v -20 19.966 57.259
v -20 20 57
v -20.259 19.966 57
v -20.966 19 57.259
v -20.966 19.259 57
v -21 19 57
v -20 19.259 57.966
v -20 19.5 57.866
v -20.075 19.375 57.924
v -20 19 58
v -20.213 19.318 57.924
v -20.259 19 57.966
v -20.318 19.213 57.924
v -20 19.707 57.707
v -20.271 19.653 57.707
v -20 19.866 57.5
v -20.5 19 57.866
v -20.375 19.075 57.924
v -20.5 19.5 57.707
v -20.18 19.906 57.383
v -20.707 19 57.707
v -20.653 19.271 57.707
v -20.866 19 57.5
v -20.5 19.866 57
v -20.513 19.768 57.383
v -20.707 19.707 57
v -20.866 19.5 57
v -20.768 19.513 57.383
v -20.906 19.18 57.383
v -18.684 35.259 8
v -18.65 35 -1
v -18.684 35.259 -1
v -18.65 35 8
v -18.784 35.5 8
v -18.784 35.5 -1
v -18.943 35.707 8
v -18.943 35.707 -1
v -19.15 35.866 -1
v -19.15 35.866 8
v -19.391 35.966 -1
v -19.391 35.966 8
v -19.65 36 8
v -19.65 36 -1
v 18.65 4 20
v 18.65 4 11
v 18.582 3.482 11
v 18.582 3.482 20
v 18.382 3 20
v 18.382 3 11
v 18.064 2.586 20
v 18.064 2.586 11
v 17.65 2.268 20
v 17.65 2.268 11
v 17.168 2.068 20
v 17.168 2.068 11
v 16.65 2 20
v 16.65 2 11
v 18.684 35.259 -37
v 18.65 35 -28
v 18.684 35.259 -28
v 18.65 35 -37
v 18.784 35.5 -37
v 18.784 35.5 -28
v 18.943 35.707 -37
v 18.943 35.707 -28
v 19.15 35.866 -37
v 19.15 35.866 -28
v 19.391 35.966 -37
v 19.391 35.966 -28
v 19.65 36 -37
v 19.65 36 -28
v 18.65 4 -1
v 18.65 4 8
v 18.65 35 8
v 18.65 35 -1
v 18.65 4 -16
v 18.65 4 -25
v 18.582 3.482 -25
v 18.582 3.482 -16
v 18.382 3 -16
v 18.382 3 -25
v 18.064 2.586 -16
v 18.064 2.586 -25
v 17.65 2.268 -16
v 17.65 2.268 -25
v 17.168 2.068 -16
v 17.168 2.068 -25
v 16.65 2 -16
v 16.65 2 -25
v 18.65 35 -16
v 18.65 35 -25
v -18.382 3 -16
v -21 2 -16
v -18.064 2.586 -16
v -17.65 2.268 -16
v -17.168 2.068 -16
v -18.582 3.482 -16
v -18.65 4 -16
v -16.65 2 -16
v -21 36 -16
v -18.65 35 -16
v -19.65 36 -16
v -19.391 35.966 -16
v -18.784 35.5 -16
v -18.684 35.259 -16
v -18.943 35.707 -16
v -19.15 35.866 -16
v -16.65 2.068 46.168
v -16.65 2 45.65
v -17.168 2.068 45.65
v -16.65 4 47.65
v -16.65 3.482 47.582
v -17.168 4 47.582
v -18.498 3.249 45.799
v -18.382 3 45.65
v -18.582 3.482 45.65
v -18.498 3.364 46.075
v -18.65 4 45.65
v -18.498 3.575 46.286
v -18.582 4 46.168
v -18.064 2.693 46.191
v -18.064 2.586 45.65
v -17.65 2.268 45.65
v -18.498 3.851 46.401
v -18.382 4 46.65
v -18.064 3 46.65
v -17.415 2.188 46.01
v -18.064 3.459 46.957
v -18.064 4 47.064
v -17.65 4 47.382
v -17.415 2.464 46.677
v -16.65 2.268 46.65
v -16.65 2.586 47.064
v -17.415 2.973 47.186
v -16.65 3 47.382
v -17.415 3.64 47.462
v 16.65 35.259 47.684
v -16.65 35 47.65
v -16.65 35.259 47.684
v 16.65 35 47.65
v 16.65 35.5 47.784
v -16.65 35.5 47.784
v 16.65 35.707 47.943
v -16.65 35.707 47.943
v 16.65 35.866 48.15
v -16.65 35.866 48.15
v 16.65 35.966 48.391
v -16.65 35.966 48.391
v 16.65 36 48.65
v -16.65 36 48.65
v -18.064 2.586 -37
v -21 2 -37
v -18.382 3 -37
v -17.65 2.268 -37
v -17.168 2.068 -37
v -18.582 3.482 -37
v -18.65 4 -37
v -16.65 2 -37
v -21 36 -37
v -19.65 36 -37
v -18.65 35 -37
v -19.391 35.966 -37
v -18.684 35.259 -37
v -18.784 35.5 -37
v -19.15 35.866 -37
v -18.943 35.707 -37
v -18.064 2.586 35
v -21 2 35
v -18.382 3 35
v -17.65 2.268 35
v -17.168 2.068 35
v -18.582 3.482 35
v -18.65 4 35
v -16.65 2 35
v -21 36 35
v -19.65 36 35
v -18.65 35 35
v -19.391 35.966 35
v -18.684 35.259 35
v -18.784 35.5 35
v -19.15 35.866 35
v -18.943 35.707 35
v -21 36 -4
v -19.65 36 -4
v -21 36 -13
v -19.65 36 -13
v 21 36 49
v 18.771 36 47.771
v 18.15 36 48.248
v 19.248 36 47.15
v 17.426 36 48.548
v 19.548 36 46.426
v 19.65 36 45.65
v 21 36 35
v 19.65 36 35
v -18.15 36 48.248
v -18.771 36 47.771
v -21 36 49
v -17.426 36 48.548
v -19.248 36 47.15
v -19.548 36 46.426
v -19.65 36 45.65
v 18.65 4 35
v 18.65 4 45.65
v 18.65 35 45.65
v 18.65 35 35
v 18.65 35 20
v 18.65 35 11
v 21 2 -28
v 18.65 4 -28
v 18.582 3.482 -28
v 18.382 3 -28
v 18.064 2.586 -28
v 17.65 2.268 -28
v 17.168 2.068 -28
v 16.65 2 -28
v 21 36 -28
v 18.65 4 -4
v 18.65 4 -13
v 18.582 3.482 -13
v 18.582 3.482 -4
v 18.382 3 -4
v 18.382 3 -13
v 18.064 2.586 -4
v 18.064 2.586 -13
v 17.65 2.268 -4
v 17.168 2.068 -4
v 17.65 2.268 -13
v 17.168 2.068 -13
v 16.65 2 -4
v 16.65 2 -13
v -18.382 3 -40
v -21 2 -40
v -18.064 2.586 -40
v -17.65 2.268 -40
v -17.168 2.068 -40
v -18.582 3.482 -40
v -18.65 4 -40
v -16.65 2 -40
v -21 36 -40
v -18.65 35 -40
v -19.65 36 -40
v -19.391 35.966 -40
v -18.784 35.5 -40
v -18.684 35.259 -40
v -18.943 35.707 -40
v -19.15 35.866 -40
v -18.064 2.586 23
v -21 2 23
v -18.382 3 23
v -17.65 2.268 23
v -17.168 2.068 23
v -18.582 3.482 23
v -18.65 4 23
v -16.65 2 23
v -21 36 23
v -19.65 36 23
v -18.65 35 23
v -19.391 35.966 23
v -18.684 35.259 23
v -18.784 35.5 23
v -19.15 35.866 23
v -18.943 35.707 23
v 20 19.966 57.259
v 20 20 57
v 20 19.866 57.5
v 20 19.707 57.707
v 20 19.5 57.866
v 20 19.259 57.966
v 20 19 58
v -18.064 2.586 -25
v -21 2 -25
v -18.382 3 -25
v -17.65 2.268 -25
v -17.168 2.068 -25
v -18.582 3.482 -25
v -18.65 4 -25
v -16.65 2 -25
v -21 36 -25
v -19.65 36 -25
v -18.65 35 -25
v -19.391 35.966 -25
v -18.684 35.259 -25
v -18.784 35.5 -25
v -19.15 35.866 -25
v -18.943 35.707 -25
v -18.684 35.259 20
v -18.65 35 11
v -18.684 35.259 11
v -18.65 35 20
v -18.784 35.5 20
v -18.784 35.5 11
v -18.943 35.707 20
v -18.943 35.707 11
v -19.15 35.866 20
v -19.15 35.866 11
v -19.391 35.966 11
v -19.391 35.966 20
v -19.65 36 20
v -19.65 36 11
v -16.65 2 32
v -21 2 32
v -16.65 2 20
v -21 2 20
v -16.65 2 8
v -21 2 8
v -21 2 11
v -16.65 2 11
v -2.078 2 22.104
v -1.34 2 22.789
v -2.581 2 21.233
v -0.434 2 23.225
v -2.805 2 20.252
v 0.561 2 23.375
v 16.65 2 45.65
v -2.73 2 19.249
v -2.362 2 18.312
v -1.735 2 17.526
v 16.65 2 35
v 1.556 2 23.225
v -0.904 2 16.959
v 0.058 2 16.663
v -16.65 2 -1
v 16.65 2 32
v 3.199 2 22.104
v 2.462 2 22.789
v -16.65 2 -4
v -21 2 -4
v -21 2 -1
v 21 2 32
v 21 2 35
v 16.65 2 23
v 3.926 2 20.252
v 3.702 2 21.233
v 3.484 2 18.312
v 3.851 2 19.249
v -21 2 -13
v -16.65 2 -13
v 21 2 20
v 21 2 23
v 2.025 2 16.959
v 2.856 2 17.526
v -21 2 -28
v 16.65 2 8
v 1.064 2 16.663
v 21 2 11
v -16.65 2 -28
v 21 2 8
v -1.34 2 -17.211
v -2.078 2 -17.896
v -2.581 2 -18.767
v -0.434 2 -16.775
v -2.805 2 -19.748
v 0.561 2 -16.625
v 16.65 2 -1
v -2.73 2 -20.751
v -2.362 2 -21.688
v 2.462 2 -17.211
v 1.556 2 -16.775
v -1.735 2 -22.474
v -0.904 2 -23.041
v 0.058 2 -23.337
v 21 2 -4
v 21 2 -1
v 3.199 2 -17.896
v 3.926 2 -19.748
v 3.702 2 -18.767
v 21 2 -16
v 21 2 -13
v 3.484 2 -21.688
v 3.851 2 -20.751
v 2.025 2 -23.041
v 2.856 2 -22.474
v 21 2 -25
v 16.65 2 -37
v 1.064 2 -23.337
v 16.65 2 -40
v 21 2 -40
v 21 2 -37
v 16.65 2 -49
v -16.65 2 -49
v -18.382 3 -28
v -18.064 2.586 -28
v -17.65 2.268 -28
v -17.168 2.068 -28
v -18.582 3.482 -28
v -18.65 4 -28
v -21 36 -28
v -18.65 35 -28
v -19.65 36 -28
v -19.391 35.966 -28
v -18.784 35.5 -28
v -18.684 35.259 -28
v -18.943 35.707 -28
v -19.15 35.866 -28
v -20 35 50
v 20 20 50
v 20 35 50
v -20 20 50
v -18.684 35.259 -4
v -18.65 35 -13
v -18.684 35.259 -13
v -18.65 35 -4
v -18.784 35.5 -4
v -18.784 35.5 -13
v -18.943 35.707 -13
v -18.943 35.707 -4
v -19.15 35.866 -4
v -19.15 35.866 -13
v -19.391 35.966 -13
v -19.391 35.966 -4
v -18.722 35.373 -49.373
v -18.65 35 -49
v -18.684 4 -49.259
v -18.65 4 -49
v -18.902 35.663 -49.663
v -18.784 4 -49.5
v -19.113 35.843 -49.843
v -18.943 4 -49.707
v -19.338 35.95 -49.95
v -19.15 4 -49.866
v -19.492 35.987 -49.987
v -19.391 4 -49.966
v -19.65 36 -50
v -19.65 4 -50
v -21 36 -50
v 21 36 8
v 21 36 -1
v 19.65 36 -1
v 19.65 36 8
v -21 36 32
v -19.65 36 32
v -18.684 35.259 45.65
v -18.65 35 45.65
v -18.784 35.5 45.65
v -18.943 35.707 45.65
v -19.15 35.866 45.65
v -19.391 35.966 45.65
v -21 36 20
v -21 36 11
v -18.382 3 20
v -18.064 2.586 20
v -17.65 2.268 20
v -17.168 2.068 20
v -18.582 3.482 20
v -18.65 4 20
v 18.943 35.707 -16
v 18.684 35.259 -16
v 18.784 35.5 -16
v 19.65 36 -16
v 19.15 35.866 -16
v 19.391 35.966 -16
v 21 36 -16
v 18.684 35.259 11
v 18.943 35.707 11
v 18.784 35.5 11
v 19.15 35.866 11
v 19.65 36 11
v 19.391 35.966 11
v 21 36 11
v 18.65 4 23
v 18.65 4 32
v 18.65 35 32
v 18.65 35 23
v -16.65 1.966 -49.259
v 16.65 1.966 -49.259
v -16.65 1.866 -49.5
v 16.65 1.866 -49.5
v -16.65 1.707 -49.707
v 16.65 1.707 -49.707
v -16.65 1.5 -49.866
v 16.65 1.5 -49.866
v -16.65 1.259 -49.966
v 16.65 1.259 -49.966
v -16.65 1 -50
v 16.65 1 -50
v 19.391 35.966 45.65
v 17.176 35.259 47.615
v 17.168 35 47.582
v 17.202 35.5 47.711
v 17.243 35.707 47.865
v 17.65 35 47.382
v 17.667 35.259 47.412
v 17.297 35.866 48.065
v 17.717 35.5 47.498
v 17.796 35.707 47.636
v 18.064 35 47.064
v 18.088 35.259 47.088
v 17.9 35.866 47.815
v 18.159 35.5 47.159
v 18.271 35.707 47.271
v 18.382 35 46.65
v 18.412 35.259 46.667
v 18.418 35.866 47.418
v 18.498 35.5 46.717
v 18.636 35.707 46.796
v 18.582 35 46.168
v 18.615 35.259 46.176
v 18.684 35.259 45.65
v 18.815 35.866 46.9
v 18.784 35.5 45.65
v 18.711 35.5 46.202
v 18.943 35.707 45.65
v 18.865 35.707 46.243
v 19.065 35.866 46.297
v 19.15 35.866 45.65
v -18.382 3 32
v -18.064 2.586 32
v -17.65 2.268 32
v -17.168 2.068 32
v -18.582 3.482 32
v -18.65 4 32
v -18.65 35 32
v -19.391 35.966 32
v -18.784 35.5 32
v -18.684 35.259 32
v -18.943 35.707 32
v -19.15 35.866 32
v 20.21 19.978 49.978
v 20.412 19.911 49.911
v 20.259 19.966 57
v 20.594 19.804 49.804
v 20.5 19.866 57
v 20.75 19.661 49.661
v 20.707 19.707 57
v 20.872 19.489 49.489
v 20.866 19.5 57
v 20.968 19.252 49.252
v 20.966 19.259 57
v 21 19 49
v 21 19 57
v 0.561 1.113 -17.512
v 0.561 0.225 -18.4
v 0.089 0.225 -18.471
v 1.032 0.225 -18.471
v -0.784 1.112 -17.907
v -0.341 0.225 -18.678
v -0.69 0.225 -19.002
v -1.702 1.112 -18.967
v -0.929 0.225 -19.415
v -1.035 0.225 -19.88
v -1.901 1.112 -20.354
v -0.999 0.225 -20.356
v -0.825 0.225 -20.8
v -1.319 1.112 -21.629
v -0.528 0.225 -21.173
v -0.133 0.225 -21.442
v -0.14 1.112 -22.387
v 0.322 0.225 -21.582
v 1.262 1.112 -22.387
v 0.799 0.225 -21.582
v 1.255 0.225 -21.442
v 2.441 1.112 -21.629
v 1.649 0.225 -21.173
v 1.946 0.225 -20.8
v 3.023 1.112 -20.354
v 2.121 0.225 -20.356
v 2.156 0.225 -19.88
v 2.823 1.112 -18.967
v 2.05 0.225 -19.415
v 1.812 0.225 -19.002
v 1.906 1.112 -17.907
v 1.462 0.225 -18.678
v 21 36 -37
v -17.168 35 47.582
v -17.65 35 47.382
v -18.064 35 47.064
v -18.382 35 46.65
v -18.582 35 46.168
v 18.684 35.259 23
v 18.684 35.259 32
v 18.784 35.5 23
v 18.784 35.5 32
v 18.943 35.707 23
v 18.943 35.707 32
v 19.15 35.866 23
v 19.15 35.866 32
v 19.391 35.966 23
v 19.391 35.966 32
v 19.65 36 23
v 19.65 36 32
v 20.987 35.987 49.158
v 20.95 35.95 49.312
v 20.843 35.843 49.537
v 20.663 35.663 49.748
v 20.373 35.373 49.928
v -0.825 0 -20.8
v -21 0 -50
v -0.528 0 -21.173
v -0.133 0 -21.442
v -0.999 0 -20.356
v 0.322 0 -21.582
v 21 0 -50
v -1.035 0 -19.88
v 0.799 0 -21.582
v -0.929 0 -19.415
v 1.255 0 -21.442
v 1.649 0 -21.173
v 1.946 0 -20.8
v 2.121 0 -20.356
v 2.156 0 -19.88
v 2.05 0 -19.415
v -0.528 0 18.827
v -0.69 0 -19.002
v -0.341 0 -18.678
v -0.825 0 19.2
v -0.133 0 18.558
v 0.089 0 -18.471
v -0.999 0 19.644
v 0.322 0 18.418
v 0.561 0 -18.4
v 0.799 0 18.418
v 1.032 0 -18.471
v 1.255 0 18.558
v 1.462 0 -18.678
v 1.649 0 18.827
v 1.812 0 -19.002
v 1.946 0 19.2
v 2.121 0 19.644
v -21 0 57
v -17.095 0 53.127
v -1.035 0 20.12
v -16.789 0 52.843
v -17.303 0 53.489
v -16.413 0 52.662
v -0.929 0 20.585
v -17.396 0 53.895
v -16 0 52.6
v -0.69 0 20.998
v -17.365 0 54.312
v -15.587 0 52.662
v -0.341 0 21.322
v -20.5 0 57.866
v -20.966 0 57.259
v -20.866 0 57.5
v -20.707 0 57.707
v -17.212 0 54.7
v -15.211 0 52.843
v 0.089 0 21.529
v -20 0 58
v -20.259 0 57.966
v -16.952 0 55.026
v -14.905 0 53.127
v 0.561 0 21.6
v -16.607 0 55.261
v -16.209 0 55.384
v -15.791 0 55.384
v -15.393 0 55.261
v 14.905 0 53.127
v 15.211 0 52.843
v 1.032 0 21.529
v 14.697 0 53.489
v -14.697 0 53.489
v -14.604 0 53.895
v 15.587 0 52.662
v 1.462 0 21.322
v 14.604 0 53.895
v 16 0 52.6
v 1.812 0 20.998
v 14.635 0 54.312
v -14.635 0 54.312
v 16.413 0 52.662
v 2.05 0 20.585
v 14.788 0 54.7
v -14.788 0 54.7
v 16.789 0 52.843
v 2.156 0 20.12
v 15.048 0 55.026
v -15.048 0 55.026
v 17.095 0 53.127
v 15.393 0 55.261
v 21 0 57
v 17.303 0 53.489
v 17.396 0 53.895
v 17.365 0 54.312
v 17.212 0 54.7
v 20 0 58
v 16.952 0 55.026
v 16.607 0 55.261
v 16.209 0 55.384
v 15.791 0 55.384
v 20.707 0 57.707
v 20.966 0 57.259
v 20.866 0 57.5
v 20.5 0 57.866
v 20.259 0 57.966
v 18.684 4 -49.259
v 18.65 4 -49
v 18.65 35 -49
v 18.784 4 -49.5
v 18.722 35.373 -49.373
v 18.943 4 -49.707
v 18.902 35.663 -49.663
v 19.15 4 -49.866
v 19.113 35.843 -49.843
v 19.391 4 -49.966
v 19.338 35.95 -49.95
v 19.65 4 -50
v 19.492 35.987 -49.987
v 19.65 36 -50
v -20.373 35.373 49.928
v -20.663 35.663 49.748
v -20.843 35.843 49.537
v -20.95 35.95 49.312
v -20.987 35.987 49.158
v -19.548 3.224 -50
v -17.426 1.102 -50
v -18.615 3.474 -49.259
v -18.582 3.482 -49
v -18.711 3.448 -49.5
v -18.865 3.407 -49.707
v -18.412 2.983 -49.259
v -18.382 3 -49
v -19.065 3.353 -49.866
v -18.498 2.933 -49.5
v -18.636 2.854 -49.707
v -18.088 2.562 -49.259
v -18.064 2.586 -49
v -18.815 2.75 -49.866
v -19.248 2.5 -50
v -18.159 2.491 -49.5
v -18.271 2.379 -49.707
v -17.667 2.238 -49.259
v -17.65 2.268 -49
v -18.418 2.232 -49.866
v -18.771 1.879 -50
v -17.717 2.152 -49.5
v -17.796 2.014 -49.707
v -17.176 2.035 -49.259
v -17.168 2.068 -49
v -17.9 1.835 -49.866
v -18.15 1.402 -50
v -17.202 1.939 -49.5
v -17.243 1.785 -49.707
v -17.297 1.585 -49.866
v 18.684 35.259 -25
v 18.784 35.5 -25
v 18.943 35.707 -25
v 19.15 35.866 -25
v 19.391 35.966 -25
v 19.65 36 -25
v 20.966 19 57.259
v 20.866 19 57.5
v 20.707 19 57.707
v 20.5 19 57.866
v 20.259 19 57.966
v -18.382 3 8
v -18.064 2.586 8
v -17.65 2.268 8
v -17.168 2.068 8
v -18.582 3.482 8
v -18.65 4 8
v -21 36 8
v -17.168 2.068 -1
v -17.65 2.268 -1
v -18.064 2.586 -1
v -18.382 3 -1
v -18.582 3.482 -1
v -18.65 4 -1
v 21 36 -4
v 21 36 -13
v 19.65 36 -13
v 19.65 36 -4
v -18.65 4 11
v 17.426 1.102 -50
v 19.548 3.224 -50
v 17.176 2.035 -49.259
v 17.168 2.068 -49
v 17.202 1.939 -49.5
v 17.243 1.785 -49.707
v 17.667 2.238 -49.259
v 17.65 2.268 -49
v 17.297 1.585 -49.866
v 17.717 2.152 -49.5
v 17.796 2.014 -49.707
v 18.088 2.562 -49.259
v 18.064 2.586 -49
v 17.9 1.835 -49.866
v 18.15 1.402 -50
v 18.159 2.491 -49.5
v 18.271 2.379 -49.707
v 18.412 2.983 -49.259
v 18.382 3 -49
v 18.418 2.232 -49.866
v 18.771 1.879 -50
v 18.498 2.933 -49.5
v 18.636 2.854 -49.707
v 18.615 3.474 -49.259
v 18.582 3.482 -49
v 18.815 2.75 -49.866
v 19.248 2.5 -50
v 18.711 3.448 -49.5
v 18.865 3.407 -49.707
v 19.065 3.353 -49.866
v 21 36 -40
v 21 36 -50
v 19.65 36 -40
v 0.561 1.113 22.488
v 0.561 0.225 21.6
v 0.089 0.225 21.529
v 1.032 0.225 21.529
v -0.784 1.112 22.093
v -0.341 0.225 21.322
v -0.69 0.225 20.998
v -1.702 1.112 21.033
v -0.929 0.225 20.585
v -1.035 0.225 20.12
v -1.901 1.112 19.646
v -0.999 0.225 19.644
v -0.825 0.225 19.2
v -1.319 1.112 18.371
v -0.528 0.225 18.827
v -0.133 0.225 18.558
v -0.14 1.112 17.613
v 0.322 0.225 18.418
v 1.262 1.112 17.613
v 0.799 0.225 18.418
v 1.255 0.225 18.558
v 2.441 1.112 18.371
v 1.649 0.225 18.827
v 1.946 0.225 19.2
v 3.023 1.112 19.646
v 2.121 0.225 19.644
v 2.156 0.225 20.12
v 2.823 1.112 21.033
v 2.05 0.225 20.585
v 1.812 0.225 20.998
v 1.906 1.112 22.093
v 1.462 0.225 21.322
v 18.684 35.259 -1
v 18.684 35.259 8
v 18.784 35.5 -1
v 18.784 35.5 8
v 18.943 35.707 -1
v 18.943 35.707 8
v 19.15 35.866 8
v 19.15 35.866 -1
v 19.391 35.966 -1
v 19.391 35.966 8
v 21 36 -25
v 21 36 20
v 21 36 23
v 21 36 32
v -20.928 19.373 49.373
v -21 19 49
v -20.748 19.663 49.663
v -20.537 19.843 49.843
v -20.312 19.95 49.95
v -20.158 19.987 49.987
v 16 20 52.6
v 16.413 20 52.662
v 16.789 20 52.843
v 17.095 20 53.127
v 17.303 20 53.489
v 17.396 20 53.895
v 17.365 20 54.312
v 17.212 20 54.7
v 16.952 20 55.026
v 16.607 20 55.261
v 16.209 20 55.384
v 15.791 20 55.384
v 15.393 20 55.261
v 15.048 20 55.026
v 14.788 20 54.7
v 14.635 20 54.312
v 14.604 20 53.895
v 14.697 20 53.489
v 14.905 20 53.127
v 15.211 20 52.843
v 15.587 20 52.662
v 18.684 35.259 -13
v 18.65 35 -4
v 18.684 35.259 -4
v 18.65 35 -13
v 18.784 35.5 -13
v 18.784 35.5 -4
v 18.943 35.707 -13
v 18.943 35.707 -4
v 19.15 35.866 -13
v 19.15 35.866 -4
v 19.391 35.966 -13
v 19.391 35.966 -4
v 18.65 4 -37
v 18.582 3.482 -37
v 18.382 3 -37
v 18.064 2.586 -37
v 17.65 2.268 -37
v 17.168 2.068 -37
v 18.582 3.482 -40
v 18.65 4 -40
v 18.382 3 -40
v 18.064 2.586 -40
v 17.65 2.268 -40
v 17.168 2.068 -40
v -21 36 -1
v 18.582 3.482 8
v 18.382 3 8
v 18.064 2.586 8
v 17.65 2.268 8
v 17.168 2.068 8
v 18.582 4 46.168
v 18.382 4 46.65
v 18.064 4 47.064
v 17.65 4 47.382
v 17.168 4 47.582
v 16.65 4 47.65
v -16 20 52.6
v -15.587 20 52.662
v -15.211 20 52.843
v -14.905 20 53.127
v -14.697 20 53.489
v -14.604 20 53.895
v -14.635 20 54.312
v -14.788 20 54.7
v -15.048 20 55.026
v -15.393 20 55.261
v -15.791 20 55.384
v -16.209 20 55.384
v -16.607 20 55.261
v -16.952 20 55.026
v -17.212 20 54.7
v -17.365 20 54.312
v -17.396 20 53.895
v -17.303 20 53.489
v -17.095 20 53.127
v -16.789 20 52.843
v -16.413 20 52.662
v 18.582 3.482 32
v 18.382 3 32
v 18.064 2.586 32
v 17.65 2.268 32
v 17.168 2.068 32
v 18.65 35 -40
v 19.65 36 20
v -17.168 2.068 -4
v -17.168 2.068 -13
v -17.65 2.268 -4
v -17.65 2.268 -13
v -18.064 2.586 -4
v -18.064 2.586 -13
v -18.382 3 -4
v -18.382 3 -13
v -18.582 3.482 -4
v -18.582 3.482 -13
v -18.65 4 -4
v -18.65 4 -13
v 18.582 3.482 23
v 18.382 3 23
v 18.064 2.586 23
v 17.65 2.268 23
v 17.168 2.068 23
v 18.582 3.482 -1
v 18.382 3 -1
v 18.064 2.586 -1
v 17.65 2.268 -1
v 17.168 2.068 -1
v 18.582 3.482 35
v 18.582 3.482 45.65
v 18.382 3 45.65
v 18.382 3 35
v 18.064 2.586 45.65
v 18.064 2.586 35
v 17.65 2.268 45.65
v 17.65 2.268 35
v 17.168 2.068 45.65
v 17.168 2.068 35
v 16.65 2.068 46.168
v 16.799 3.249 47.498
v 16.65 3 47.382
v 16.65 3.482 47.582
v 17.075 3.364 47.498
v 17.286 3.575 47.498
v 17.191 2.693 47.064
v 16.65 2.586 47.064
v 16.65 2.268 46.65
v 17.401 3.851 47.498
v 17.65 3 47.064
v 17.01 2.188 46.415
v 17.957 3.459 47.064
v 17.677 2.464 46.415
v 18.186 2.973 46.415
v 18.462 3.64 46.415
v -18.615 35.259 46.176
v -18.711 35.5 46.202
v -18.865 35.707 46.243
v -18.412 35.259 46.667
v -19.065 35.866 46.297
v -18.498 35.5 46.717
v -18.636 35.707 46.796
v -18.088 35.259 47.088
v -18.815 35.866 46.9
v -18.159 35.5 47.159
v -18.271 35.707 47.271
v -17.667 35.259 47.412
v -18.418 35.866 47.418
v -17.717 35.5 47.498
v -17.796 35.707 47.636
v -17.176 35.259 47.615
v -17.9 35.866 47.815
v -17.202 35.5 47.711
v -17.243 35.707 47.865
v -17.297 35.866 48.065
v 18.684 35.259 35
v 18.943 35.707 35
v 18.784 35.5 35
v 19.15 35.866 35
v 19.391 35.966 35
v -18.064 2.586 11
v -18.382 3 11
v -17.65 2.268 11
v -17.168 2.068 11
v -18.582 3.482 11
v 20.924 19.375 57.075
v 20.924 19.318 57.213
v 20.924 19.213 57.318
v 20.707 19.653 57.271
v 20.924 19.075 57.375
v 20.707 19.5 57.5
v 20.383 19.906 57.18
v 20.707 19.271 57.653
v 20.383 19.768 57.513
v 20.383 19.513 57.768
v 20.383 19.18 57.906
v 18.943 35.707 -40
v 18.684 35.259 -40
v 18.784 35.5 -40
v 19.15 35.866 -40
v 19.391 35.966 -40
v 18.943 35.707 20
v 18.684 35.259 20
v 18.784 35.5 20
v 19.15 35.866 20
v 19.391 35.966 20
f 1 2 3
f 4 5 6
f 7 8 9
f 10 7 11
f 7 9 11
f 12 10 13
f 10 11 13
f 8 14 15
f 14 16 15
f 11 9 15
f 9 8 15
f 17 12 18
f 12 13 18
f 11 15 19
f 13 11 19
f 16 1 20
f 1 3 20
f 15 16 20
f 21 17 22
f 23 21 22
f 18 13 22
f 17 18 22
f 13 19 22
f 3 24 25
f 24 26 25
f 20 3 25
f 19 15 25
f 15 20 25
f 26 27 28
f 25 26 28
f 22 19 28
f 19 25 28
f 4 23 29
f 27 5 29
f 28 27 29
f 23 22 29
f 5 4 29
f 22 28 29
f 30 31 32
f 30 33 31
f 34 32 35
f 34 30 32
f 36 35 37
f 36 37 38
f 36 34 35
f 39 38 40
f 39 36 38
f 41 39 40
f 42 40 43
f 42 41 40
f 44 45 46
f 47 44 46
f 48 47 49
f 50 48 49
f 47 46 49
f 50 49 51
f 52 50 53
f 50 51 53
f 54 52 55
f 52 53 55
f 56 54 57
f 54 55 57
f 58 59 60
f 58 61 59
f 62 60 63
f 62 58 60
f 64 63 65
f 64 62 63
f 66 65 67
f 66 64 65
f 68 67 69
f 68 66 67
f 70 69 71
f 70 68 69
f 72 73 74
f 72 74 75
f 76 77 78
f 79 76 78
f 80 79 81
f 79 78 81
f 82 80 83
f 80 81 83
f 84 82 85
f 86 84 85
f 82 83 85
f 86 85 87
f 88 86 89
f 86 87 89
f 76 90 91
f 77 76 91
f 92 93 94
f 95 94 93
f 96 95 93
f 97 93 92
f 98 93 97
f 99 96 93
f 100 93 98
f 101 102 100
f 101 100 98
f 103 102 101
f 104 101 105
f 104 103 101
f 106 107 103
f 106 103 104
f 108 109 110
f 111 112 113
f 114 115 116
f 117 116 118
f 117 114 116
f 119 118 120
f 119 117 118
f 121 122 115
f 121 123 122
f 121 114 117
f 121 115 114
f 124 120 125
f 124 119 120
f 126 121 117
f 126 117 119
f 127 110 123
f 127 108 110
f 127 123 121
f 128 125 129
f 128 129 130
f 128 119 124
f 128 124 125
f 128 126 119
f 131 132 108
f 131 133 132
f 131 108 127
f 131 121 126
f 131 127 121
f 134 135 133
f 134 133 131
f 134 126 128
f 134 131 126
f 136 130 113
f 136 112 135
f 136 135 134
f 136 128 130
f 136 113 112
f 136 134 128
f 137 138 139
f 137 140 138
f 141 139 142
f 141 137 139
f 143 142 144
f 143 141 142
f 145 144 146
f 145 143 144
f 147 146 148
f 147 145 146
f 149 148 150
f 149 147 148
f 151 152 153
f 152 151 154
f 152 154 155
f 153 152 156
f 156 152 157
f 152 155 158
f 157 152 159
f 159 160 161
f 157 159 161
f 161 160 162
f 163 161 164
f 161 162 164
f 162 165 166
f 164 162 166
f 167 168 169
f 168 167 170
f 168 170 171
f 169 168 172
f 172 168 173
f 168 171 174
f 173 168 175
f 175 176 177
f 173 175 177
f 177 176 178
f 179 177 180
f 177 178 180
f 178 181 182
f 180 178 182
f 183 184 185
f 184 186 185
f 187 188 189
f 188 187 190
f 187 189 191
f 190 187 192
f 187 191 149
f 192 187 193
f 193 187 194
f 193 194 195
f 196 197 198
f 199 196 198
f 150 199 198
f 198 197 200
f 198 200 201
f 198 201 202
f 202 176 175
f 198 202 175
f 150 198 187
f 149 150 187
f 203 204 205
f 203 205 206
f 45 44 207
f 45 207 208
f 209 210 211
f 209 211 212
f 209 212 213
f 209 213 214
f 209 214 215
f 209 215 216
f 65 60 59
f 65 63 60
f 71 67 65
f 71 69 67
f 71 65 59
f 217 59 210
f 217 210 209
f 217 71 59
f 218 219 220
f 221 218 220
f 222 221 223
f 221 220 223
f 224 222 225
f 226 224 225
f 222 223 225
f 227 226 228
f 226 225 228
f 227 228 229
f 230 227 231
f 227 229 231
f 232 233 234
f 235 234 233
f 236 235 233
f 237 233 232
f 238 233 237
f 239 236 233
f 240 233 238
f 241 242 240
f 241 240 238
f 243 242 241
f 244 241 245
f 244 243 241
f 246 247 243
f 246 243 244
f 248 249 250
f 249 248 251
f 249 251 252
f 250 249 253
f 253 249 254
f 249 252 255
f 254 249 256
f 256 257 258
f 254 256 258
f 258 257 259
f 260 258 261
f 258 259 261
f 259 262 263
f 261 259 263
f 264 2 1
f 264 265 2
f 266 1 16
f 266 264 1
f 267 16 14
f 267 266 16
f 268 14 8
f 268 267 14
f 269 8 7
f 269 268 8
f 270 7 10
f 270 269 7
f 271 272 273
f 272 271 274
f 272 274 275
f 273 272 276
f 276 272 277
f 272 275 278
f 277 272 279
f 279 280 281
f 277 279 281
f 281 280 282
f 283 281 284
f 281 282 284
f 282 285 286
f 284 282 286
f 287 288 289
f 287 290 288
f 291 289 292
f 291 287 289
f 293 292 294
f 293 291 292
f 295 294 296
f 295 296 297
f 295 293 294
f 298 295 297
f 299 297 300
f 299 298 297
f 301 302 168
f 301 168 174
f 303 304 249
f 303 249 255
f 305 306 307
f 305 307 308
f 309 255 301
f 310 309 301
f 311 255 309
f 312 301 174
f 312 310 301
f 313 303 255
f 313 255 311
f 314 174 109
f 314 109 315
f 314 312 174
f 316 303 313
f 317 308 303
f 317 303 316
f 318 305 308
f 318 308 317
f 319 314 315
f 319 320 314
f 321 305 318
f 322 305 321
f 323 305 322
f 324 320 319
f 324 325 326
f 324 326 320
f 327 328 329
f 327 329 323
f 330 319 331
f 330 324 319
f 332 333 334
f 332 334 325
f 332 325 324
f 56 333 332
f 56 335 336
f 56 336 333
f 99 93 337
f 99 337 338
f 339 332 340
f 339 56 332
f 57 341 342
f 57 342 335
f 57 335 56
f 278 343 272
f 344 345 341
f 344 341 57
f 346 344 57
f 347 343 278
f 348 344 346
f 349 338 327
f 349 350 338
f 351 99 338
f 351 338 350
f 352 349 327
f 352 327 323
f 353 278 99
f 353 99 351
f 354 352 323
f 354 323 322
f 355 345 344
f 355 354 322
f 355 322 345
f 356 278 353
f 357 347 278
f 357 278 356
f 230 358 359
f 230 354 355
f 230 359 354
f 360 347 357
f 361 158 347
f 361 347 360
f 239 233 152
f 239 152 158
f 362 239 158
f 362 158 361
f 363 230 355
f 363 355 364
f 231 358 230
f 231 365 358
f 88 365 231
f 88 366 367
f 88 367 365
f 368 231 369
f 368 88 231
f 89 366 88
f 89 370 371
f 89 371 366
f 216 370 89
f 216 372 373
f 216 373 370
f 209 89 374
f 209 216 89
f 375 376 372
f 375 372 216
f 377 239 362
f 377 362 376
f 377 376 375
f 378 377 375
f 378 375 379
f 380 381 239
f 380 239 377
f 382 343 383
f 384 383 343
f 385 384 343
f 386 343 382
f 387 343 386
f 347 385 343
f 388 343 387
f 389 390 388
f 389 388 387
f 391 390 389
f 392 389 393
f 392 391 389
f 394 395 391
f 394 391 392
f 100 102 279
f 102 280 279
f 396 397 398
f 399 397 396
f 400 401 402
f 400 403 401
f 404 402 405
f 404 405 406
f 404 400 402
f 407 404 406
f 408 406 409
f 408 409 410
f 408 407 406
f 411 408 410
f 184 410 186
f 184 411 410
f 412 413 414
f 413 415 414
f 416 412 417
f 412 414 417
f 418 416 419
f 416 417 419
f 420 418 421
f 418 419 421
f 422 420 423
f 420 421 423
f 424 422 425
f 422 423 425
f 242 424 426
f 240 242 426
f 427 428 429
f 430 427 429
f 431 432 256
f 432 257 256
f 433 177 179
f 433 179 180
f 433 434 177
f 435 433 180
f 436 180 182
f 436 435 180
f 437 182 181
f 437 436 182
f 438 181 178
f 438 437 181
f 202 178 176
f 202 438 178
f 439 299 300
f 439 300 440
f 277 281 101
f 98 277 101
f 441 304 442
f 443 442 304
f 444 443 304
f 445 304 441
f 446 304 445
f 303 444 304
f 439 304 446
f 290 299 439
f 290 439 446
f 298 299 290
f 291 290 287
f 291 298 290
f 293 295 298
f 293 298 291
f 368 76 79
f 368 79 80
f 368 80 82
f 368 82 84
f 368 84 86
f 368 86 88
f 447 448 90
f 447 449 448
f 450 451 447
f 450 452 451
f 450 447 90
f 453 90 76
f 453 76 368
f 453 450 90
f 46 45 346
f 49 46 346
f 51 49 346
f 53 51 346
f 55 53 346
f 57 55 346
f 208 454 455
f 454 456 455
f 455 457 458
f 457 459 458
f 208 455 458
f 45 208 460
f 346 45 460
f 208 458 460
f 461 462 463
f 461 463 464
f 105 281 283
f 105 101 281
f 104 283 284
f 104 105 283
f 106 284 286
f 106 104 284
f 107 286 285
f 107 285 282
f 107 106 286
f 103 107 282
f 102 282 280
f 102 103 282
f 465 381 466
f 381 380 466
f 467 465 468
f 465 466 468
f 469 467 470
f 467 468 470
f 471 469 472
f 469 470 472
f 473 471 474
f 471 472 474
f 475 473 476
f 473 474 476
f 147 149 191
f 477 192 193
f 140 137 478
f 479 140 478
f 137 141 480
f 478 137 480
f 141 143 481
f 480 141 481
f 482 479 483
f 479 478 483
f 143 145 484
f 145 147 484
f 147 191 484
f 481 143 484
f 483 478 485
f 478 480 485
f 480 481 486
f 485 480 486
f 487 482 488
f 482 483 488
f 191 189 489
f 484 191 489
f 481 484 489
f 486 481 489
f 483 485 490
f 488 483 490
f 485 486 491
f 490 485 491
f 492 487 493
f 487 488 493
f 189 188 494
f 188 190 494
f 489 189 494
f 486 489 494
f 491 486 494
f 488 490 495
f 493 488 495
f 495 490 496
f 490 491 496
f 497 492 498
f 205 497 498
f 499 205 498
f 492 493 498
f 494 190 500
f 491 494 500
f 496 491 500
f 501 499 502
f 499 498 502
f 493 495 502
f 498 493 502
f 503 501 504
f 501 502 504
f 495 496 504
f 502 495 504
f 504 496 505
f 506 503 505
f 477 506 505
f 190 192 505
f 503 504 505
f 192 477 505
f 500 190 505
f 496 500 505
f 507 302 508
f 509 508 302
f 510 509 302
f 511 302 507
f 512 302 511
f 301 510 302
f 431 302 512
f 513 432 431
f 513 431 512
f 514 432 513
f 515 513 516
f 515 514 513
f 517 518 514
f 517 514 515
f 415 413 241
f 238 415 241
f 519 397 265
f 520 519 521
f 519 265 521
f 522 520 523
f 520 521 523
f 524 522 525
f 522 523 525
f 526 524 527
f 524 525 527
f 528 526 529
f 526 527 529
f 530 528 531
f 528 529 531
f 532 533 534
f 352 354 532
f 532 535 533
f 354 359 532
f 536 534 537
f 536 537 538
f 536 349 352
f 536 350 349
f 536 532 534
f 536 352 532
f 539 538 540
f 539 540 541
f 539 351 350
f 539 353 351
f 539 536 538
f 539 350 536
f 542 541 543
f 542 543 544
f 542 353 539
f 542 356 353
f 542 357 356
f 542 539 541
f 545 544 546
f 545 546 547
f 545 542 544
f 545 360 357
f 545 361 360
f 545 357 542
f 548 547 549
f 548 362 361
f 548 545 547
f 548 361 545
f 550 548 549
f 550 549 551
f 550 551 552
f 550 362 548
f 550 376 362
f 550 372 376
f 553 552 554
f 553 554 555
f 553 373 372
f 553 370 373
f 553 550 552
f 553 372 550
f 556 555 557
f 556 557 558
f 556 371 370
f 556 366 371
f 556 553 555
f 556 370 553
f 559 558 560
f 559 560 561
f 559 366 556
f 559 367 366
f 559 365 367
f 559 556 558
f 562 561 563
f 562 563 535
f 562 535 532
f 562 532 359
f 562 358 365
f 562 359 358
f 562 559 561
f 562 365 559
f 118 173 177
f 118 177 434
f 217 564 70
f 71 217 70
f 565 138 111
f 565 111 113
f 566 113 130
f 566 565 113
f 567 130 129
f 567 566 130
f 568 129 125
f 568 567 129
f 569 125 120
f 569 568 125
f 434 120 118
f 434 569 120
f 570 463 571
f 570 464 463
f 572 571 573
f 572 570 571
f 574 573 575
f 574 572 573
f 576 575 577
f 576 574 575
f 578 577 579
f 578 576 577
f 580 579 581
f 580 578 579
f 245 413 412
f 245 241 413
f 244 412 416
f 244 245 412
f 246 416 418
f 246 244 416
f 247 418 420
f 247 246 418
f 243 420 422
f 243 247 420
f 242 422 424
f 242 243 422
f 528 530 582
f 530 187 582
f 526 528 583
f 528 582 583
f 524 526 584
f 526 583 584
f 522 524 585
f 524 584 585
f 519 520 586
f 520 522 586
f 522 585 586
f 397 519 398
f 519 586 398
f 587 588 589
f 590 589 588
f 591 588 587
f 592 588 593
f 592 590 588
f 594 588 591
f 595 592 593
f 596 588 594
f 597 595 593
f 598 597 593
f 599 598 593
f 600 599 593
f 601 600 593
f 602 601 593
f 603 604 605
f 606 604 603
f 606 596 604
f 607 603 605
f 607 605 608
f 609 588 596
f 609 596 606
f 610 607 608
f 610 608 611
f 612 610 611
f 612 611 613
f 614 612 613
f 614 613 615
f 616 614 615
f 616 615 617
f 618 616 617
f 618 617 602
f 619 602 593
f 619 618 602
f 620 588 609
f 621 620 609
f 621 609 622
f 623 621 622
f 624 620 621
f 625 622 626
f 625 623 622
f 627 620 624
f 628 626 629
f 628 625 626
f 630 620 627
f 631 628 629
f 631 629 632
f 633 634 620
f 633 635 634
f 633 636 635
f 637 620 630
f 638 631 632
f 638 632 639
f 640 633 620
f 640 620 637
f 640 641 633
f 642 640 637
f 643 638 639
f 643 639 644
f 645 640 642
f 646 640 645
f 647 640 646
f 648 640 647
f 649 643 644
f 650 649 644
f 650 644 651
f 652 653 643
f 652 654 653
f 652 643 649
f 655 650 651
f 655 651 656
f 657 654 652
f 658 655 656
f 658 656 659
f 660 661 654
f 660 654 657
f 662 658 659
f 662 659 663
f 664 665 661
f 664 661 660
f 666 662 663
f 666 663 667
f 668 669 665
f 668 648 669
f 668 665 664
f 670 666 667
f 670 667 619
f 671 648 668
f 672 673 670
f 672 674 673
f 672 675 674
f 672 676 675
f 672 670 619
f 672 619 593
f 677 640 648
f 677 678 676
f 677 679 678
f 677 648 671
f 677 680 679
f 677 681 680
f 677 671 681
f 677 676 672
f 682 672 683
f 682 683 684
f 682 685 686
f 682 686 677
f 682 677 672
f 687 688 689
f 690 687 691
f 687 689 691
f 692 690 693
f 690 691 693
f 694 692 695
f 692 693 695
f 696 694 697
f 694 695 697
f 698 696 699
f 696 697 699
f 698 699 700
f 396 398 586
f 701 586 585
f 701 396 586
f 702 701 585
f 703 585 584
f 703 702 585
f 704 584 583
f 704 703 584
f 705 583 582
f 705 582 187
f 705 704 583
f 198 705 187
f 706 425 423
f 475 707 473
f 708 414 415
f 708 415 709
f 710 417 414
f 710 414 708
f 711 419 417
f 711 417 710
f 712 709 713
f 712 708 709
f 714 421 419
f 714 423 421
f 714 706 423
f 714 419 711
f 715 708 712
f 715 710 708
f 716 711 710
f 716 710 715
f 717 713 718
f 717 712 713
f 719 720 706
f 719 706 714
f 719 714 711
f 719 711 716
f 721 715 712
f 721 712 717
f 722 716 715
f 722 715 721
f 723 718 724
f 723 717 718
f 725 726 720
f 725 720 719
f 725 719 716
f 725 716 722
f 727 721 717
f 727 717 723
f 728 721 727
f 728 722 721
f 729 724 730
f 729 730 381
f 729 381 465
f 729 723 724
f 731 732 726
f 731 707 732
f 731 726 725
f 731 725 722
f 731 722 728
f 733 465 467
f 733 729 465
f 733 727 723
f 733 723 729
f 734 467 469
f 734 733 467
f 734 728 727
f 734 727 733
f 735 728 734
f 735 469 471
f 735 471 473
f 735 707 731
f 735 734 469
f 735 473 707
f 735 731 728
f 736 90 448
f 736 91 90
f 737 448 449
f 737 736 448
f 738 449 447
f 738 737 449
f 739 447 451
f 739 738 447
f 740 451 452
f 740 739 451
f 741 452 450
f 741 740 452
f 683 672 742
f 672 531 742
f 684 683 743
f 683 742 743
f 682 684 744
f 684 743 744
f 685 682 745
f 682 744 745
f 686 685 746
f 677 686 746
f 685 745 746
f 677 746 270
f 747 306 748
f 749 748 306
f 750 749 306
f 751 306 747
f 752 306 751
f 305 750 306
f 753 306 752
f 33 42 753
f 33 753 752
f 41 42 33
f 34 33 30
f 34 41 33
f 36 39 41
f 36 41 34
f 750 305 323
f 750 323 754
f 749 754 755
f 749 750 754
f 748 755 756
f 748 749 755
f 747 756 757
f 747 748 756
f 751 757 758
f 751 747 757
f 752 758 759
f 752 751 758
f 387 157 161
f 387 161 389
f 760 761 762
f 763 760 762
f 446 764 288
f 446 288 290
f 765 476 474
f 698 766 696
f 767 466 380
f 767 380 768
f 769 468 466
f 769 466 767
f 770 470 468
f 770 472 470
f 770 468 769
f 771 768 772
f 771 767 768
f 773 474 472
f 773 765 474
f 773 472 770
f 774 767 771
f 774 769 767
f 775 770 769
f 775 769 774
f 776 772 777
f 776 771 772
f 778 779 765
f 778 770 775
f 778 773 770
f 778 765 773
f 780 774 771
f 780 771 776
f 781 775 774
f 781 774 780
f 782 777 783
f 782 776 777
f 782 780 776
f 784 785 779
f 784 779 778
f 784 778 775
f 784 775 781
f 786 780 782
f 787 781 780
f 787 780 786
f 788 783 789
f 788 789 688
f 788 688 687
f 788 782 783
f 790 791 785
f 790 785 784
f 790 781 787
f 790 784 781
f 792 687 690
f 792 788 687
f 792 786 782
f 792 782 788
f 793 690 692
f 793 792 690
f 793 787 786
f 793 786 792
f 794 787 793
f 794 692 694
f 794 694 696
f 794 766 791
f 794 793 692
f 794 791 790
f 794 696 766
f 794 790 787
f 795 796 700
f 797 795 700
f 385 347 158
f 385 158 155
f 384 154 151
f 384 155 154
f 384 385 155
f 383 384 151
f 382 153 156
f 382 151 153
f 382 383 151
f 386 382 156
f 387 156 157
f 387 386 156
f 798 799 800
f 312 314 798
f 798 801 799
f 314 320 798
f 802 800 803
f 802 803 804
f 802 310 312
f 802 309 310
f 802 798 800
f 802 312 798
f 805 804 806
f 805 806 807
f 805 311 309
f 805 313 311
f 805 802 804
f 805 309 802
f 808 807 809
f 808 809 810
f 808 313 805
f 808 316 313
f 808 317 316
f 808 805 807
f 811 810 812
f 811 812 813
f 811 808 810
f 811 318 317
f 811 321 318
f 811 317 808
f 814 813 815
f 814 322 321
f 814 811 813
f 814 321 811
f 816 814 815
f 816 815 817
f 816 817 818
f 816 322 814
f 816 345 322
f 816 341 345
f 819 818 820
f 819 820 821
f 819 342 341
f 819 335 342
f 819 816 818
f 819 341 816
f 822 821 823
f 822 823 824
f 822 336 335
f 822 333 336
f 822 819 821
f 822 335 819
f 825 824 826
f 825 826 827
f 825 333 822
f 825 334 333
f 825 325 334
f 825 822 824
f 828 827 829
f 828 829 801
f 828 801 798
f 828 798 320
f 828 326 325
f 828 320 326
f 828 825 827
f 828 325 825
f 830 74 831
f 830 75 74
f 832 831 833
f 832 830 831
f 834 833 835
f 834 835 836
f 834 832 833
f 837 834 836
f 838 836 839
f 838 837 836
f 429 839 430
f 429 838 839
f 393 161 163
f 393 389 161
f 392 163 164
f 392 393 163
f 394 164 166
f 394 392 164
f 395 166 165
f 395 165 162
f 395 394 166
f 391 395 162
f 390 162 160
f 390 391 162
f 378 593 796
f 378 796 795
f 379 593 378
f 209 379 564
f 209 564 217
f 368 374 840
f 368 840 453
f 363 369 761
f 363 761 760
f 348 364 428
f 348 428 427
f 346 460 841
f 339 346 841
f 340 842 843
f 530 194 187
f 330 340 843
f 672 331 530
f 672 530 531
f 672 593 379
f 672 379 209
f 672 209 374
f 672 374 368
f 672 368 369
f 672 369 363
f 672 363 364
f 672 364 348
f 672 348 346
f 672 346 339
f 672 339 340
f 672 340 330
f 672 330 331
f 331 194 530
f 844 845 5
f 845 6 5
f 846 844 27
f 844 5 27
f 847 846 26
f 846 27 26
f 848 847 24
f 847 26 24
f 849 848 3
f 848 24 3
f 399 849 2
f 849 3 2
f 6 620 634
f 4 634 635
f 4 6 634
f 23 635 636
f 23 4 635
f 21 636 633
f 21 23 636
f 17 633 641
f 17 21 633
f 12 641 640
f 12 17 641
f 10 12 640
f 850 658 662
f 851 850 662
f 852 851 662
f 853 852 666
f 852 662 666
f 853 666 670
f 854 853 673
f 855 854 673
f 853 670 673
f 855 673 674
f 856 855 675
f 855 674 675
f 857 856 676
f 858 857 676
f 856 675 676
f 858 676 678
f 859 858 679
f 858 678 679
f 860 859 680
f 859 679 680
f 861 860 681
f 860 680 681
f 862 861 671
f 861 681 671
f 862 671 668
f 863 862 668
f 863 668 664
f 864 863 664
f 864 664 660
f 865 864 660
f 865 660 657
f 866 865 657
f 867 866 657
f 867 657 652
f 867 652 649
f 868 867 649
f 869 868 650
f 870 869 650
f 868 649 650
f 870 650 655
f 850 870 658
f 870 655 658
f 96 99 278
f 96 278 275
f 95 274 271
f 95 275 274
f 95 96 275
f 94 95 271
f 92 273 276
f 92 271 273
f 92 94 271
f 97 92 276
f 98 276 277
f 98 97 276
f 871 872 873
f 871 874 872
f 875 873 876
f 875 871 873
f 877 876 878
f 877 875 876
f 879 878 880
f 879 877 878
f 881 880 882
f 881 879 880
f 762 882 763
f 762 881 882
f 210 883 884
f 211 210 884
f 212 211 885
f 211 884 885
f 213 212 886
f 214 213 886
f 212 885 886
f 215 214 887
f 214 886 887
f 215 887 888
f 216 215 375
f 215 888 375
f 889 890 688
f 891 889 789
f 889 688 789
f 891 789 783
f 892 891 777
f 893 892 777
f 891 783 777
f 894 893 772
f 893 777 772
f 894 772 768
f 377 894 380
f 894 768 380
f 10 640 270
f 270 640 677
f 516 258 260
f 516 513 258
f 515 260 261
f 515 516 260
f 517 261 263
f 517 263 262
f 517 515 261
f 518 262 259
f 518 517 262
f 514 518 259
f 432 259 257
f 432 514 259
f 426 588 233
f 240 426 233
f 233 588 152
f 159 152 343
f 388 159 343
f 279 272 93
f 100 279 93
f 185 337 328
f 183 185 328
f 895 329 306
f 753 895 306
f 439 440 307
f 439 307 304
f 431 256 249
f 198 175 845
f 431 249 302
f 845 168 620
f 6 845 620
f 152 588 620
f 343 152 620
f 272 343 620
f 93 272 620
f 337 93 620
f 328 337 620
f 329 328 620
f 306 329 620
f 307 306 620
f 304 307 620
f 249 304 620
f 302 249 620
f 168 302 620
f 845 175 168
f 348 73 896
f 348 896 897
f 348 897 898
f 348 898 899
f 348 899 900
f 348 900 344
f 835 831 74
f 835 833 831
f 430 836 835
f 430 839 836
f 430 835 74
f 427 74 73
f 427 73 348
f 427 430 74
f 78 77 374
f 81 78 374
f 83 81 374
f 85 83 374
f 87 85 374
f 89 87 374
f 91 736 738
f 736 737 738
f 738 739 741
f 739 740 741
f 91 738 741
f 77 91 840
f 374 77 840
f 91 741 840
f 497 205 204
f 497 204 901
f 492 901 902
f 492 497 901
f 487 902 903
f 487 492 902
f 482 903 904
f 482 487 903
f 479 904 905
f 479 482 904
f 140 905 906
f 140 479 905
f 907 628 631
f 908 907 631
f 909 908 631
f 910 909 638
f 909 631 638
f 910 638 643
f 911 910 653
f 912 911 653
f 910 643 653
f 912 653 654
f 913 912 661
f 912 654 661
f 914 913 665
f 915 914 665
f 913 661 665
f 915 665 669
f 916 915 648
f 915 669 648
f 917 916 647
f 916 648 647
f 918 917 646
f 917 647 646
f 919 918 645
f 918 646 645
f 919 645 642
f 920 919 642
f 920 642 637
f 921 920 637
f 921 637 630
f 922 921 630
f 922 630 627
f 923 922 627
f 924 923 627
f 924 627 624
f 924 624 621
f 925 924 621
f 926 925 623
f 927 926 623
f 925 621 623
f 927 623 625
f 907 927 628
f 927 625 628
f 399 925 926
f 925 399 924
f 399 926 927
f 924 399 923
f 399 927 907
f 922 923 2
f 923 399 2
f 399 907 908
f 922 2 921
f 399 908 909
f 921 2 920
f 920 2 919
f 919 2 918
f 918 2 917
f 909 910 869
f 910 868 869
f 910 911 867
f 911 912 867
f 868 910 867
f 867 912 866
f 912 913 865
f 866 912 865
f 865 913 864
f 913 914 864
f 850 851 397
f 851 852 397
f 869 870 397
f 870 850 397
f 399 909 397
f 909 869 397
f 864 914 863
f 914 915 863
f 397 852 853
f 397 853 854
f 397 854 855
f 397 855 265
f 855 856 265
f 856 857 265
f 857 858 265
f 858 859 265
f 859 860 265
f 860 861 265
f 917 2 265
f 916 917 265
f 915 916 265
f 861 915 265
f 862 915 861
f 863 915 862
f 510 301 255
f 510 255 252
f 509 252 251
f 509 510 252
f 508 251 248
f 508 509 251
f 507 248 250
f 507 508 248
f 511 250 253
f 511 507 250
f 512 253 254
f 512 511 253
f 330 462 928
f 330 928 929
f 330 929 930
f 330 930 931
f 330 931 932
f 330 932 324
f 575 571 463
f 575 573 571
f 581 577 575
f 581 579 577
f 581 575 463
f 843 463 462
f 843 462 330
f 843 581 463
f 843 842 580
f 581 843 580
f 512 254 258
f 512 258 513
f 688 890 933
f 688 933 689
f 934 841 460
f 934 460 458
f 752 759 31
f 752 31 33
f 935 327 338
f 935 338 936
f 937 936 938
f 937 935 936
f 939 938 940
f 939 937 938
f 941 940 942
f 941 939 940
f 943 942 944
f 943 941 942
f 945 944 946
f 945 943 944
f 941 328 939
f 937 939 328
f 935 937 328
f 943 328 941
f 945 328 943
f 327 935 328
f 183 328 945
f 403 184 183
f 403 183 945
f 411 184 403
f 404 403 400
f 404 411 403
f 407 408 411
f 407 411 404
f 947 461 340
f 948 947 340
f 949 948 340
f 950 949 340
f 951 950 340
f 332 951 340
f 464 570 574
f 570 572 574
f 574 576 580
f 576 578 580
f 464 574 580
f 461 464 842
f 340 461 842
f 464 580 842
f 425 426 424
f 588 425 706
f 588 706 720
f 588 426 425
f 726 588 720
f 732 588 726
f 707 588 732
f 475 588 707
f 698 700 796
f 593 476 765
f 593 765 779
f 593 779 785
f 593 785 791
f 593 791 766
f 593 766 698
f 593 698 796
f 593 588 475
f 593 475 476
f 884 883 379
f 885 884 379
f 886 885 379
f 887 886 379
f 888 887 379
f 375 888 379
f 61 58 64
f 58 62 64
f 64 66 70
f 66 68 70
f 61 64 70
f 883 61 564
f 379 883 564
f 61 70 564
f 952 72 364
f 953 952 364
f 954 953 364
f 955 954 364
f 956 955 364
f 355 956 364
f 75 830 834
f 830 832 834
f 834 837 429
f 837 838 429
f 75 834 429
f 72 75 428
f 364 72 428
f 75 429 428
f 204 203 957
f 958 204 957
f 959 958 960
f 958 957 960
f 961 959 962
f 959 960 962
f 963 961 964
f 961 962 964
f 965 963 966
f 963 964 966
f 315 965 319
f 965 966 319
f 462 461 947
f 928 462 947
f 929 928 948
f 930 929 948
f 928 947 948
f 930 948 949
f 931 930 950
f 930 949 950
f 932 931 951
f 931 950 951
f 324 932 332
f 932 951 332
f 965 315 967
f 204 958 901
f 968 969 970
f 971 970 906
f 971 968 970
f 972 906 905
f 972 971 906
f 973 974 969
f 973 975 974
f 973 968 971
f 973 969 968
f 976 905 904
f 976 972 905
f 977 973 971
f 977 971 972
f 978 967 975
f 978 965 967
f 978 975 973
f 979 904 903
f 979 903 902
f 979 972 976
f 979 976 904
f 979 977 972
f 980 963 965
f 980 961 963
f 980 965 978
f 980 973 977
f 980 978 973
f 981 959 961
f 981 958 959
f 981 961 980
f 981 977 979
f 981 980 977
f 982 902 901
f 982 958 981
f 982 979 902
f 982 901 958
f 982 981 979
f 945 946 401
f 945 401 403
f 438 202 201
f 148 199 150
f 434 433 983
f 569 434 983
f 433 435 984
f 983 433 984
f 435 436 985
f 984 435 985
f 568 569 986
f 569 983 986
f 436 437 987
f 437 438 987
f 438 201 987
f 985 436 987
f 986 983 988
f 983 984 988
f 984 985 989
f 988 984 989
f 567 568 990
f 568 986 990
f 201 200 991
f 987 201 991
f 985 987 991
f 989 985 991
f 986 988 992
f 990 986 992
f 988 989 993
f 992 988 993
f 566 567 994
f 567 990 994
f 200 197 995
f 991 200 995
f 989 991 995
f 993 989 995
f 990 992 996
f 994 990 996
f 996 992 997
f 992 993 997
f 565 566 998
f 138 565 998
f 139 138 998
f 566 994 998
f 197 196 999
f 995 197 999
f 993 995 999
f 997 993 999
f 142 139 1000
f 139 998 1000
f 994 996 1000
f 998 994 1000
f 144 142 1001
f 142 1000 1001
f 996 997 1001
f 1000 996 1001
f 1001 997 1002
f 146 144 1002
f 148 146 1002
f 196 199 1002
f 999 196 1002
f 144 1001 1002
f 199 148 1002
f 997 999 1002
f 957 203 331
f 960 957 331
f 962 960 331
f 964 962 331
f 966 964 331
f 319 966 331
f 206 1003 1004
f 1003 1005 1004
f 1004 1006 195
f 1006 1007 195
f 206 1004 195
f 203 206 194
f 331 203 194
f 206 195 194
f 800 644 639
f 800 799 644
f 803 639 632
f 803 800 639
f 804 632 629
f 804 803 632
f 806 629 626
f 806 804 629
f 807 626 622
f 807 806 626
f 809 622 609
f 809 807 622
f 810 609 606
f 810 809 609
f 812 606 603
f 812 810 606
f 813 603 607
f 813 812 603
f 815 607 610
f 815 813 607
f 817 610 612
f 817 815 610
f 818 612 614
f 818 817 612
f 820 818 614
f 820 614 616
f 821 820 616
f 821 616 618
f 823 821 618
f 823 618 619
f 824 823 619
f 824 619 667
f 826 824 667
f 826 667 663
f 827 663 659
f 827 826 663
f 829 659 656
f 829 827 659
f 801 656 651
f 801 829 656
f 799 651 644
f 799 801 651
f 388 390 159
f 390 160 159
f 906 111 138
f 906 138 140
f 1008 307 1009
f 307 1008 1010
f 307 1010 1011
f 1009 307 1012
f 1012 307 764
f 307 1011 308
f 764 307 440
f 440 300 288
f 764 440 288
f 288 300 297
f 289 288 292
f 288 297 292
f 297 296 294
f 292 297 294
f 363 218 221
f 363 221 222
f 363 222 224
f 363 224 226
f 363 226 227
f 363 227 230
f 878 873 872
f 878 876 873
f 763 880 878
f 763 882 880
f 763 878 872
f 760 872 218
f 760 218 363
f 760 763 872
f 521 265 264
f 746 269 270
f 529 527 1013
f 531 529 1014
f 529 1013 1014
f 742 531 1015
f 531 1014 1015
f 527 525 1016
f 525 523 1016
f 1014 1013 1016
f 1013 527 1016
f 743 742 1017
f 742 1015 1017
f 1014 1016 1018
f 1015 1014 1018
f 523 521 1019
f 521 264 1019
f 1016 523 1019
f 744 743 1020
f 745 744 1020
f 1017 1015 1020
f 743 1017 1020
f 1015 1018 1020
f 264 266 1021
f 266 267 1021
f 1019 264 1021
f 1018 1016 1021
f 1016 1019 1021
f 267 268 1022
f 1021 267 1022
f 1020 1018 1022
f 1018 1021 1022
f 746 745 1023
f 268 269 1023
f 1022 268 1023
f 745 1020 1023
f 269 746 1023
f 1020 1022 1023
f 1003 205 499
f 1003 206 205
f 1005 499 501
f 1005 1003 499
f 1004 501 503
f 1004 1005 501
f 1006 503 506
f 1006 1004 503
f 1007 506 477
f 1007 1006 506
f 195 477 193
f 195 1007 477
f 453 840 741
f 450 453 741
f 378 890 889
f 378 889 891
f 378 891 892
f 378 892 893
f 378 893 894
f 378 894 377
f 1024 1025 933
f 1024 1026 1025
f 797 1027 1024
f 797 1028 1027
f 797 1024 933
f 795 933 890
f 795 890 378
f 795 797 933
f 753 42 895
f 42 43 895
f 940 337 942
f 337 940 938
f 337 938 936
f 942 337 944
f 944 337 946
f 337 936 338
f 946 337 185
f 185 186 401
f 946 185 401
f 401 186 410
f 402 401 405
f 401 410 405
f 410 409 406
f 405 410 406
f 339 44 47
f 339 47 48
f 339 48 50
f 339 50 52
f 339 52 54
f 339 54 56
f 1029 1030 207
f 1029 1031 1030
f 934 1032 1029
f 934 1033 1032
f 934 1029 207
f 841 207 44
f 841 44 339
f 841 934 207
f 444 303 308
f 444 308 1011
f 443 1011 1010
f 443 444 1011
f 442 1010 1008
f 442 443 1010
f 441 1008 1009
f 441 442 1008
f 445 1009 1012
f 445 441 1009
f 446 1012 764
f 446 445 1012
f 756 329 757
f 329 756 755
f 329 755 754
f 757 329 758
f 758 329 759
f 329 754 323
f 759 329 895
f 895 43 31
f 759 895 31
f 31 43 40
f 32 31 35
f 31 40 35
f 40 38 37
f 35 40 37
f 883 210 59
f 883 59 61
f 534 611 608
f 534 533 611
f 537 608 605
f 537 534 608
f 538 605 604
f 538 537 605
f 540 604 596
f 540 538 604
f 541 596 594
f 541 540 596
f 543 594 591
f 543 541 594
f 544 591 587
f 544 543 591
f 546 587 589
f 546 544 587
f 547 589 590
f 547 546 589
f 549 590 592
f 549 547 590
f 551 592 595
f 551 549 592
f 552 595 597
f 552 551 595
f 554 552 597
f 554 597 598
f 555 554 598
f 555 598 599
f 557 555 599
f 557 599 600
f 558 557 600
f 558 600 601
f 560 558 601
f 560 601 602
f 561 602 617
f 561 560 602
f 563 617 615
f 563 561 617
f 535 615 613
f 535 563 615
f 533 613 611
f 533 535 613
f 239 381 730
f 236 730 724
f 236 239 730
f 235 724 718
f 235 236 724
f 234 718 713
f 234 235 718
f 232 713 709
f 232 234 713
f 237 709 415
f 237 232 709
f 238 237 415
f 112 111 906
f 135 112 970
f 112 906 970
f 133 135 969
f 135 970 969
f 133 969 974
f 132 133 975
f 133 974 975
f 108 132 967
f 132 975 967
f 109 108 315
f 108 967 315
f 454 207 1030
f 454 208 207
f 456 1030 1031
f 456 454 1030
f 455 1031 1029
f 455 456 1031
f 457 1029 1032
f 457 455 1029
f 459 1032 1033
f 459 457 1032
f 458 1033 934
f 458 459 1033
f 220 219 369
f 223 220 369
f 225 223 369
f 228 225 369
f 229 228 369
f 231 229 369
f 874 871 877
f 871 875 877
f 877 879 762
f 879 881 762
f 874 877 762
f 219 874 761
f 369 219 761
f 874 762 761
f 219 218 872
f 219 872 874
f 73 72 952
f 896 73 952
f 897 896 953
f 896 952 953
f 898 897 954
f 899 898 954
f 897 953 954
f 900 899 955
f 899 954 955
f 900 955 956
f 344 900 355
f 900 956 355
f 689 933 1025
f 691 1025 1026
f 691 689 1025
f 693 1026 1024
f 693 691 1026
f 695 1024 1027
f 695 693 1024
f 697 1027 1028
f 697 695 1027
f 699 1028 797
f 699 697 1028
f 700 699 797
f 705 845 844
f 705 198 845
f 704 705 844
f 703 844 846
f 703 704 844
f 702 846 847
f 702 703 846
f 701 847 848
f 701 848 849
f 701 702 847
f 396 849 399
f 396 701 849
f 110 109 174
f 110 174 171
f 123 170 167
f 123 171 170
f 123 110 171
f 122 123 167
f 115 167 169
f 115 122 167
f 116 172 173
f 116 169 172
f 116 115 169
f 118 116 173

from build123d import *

# Parameters (mm, degrees)
SKETCH1_W                                      = 42
SKETCH1_H                                      = 100
BOSS_EXTRUDE1_DEPTH                            = 2
BOSS_EXTRUDE2_DEPTH                            = 34
FILLET1_R                                      = 2
CUT_EXTRUDE1_REACH                             = 67.092
SKETCH3_W                                      = 42
SKETCH3_H                                      = 3
LPATTERN1_COUNT                                = 7
LPATTERN1_PITCH                                = 12
CSK_FOR_M3_FLAT_HEAD_MACHINE_SCREW1_AT_2_COUNT = 2
CSK_FOR_M3_FLAT_HEAD_MACHINE_SCREW1_AT_2_PITCH = 40
SKETCH7_W                                      = 42
SKETCH7_H                                      = 8
SKETCH7_R                                      = 1.4
BOSS_EXTRUDE3_DEPTH                            = 20
FILLET2_R                                      = 1


with BuildPart() as part:
    # Sketch1 → Boss-Extrude1 (new body)
    with BuildSketch(Plane(origin=(0, 0, 0), x_dir=(1, 0, 0), z_dir=(0, 1, 0))):
        Rectangle(SKETCH1_W, SKETCH1_H)
    extrude(amount=BOSS_EXTRUDE1_DEPTH)

    # Sketch2 → Boss-Extrude2 (add)
    with BuildSketch(Plane(origin=(0, 2, 0), x_dir=(1, 0, 0), z_dir=(0, 1, 0))):
        Polygon((-21, 50), (-18.65, 50), (-18.65, -47.65), (18.65, -47.65), (18.65, 50), (21, 50), (21, -50), (-21, -50), align=None)
    extrude(amount=BOSS_EXTRUDE2_DEPTH)

    # Fillet1
    fillet1_edges = [part.edges().sort_by_distance(p)[0] for p in [
        (18.65, 2, -1.175),
        (0, 2, 47.65),
        (18.65, 19, 47.65),
        (-18.65, 2, -1.175),
        (-18.65, 19, 47.65),
    ]]
    fillet(fillet1_edges, radius=FILLET1_R)

    # Cut-Extrude1: up to this face of the body (flat: up to its plane)
    cut_extrude1_end = Plane(part.part.faces().sort_by_distance((0, 2, -2.175))[0])
    # Sketch3 → Cut-Extrude1 (cut, up to the picked face)
    with BuildSketch(Plane(origin=(0, 36, 0), x_dir=(1, 0, 0), z_dir=(0, 1, 0)), mode=Mode.PRIVATE) as cut_extrude1_sk1:
        with Locations((0, 38.5)):
            Rectangle(SKETCH3_W, SKETCH3_H)
    cut_extrude1_tool1 = split(extrude(cut_extrude1_sk1.sketch, amount=-CUT_EXTRUDE1_REACH, mode=Mode.PRIVATE), bisect_by=cut_extrude1_end, keep=Keep.BOTH, mode=Mode.PRIVATE)
    cut_extrude1 = cut_extrude1_tool1.solids().sort_by(Axis((0, 36, -38.5), (0, -1, 0)))[0]
    add(cut_extrude1, mode=Mode.SUBTRACT)

    # LPattern1: Cut-Extrude1 ×7
    with Locations(*[(0, 0, i * LPATTERN1_PITCH) for i in range(1, LPATTERN1_COUNT)]):
        add(cut_extrude1, mode=Mode.SUBTRACT)

    # Sketch5 → CSK for M3 Flat Head Machine Screw1 (revolve, cut)
    with BuildSketch(Plane(origin=(0.560724051, 2, -20), x_dir=(0, 0, 1), z_dir=(1, 0, 0))):
        Polygon((0, 0), (0, 2), (1.6, 2), (1.6, 1.775), (3.375, 0), align=None)
    csk_for_m3_flat_head_machine_screw1 = revolve(axis=Axis((0.560724051, 8.35, -20), (0, -1, 0)), mode=Mode.SUBTRACT)

    # CSK for M3 Flat Head Machine Screw1 at 2: CSK for M3 Flat Head Machine Screw1 ×2
    with Locations(*[(0, 0, i * CSK_FOR_M3_FLAT_HEAD_MACHINE_SCREW1_AT_2_PITCH) for i in range(1, CSK_FOR_M3_FLAT_HEAD_MACHINE_SCREW1_AT_2_COUNT)]):
        add(csk_for_m3_flat_head_machine_screw1, mode=Mode.SUBTRACT)

    # Sketch7 → Boss-Extrude3 (add)
    with BuildSketch(Plane.XZ):
        with Locations((0, 54)):
            Rectangle(SKETCH7_W, SKETCH7_H)
        with Locations(Location((-16, 54, 0), (0, 0, 270))):
            Circle(SKETCH7_R, mode=Mode.SUBTRACT)
        with Locations(Location((16, 54, 0), (0, 0, 270))):
            Circle(SKETCH7_R, mode=Mode.SUBTRACT)
    extrude(amount=-BOSS_EXTRUDE3_DEPTH)

    # Fillet2
    fillet2_edges = [part.edges().sort_by_distance(p)[0] for p in [
        (18.65, 36, -20.5),
        (18.65, 36, -8.5),
        (18.65, 36, 3.5),
        (18.65, 36, 15.5),
        (18.65, 36, 27.5),
        (18.65, 36, 40.325),
        (-18.65, 36, 27.5),
        (-18.65, 36, 15.5),
        (-18.65, 36, 3.5),
        (-18.65, 36, -8.5),
        (-18.65, 36, -20.5),
        (-18.65, 36, -32.5),
        (18.65, 20, -50),
        (-18.65, 20, -50),
        (0, 36, 50),
        (18.65, 36, -45),
        (-21, 20, 54),
        (0, 20, 58),
        (-21, 10, 58),
        (21, 20, 54),
        (21, 10, 58),
        (0, 36, 47.65),
        (-18.65, 36, 40.325),
        (0, 2, -50),
        (18.064213562, 36, 47.064213562),
        (-18.064213562, 36, 47.064213562),
        (18.064213562, 2.585786438, -50),
        (-18.064213562, 2.585786438, -50),
        (18.65, 36, -32.5),
        (-18.65, 36, -45),
        (21, 28, 50),
        (-21, 28, 50),
    ]]
    fillet(fillet2_edges, radius=FILLET2_R)


solid = part.part
